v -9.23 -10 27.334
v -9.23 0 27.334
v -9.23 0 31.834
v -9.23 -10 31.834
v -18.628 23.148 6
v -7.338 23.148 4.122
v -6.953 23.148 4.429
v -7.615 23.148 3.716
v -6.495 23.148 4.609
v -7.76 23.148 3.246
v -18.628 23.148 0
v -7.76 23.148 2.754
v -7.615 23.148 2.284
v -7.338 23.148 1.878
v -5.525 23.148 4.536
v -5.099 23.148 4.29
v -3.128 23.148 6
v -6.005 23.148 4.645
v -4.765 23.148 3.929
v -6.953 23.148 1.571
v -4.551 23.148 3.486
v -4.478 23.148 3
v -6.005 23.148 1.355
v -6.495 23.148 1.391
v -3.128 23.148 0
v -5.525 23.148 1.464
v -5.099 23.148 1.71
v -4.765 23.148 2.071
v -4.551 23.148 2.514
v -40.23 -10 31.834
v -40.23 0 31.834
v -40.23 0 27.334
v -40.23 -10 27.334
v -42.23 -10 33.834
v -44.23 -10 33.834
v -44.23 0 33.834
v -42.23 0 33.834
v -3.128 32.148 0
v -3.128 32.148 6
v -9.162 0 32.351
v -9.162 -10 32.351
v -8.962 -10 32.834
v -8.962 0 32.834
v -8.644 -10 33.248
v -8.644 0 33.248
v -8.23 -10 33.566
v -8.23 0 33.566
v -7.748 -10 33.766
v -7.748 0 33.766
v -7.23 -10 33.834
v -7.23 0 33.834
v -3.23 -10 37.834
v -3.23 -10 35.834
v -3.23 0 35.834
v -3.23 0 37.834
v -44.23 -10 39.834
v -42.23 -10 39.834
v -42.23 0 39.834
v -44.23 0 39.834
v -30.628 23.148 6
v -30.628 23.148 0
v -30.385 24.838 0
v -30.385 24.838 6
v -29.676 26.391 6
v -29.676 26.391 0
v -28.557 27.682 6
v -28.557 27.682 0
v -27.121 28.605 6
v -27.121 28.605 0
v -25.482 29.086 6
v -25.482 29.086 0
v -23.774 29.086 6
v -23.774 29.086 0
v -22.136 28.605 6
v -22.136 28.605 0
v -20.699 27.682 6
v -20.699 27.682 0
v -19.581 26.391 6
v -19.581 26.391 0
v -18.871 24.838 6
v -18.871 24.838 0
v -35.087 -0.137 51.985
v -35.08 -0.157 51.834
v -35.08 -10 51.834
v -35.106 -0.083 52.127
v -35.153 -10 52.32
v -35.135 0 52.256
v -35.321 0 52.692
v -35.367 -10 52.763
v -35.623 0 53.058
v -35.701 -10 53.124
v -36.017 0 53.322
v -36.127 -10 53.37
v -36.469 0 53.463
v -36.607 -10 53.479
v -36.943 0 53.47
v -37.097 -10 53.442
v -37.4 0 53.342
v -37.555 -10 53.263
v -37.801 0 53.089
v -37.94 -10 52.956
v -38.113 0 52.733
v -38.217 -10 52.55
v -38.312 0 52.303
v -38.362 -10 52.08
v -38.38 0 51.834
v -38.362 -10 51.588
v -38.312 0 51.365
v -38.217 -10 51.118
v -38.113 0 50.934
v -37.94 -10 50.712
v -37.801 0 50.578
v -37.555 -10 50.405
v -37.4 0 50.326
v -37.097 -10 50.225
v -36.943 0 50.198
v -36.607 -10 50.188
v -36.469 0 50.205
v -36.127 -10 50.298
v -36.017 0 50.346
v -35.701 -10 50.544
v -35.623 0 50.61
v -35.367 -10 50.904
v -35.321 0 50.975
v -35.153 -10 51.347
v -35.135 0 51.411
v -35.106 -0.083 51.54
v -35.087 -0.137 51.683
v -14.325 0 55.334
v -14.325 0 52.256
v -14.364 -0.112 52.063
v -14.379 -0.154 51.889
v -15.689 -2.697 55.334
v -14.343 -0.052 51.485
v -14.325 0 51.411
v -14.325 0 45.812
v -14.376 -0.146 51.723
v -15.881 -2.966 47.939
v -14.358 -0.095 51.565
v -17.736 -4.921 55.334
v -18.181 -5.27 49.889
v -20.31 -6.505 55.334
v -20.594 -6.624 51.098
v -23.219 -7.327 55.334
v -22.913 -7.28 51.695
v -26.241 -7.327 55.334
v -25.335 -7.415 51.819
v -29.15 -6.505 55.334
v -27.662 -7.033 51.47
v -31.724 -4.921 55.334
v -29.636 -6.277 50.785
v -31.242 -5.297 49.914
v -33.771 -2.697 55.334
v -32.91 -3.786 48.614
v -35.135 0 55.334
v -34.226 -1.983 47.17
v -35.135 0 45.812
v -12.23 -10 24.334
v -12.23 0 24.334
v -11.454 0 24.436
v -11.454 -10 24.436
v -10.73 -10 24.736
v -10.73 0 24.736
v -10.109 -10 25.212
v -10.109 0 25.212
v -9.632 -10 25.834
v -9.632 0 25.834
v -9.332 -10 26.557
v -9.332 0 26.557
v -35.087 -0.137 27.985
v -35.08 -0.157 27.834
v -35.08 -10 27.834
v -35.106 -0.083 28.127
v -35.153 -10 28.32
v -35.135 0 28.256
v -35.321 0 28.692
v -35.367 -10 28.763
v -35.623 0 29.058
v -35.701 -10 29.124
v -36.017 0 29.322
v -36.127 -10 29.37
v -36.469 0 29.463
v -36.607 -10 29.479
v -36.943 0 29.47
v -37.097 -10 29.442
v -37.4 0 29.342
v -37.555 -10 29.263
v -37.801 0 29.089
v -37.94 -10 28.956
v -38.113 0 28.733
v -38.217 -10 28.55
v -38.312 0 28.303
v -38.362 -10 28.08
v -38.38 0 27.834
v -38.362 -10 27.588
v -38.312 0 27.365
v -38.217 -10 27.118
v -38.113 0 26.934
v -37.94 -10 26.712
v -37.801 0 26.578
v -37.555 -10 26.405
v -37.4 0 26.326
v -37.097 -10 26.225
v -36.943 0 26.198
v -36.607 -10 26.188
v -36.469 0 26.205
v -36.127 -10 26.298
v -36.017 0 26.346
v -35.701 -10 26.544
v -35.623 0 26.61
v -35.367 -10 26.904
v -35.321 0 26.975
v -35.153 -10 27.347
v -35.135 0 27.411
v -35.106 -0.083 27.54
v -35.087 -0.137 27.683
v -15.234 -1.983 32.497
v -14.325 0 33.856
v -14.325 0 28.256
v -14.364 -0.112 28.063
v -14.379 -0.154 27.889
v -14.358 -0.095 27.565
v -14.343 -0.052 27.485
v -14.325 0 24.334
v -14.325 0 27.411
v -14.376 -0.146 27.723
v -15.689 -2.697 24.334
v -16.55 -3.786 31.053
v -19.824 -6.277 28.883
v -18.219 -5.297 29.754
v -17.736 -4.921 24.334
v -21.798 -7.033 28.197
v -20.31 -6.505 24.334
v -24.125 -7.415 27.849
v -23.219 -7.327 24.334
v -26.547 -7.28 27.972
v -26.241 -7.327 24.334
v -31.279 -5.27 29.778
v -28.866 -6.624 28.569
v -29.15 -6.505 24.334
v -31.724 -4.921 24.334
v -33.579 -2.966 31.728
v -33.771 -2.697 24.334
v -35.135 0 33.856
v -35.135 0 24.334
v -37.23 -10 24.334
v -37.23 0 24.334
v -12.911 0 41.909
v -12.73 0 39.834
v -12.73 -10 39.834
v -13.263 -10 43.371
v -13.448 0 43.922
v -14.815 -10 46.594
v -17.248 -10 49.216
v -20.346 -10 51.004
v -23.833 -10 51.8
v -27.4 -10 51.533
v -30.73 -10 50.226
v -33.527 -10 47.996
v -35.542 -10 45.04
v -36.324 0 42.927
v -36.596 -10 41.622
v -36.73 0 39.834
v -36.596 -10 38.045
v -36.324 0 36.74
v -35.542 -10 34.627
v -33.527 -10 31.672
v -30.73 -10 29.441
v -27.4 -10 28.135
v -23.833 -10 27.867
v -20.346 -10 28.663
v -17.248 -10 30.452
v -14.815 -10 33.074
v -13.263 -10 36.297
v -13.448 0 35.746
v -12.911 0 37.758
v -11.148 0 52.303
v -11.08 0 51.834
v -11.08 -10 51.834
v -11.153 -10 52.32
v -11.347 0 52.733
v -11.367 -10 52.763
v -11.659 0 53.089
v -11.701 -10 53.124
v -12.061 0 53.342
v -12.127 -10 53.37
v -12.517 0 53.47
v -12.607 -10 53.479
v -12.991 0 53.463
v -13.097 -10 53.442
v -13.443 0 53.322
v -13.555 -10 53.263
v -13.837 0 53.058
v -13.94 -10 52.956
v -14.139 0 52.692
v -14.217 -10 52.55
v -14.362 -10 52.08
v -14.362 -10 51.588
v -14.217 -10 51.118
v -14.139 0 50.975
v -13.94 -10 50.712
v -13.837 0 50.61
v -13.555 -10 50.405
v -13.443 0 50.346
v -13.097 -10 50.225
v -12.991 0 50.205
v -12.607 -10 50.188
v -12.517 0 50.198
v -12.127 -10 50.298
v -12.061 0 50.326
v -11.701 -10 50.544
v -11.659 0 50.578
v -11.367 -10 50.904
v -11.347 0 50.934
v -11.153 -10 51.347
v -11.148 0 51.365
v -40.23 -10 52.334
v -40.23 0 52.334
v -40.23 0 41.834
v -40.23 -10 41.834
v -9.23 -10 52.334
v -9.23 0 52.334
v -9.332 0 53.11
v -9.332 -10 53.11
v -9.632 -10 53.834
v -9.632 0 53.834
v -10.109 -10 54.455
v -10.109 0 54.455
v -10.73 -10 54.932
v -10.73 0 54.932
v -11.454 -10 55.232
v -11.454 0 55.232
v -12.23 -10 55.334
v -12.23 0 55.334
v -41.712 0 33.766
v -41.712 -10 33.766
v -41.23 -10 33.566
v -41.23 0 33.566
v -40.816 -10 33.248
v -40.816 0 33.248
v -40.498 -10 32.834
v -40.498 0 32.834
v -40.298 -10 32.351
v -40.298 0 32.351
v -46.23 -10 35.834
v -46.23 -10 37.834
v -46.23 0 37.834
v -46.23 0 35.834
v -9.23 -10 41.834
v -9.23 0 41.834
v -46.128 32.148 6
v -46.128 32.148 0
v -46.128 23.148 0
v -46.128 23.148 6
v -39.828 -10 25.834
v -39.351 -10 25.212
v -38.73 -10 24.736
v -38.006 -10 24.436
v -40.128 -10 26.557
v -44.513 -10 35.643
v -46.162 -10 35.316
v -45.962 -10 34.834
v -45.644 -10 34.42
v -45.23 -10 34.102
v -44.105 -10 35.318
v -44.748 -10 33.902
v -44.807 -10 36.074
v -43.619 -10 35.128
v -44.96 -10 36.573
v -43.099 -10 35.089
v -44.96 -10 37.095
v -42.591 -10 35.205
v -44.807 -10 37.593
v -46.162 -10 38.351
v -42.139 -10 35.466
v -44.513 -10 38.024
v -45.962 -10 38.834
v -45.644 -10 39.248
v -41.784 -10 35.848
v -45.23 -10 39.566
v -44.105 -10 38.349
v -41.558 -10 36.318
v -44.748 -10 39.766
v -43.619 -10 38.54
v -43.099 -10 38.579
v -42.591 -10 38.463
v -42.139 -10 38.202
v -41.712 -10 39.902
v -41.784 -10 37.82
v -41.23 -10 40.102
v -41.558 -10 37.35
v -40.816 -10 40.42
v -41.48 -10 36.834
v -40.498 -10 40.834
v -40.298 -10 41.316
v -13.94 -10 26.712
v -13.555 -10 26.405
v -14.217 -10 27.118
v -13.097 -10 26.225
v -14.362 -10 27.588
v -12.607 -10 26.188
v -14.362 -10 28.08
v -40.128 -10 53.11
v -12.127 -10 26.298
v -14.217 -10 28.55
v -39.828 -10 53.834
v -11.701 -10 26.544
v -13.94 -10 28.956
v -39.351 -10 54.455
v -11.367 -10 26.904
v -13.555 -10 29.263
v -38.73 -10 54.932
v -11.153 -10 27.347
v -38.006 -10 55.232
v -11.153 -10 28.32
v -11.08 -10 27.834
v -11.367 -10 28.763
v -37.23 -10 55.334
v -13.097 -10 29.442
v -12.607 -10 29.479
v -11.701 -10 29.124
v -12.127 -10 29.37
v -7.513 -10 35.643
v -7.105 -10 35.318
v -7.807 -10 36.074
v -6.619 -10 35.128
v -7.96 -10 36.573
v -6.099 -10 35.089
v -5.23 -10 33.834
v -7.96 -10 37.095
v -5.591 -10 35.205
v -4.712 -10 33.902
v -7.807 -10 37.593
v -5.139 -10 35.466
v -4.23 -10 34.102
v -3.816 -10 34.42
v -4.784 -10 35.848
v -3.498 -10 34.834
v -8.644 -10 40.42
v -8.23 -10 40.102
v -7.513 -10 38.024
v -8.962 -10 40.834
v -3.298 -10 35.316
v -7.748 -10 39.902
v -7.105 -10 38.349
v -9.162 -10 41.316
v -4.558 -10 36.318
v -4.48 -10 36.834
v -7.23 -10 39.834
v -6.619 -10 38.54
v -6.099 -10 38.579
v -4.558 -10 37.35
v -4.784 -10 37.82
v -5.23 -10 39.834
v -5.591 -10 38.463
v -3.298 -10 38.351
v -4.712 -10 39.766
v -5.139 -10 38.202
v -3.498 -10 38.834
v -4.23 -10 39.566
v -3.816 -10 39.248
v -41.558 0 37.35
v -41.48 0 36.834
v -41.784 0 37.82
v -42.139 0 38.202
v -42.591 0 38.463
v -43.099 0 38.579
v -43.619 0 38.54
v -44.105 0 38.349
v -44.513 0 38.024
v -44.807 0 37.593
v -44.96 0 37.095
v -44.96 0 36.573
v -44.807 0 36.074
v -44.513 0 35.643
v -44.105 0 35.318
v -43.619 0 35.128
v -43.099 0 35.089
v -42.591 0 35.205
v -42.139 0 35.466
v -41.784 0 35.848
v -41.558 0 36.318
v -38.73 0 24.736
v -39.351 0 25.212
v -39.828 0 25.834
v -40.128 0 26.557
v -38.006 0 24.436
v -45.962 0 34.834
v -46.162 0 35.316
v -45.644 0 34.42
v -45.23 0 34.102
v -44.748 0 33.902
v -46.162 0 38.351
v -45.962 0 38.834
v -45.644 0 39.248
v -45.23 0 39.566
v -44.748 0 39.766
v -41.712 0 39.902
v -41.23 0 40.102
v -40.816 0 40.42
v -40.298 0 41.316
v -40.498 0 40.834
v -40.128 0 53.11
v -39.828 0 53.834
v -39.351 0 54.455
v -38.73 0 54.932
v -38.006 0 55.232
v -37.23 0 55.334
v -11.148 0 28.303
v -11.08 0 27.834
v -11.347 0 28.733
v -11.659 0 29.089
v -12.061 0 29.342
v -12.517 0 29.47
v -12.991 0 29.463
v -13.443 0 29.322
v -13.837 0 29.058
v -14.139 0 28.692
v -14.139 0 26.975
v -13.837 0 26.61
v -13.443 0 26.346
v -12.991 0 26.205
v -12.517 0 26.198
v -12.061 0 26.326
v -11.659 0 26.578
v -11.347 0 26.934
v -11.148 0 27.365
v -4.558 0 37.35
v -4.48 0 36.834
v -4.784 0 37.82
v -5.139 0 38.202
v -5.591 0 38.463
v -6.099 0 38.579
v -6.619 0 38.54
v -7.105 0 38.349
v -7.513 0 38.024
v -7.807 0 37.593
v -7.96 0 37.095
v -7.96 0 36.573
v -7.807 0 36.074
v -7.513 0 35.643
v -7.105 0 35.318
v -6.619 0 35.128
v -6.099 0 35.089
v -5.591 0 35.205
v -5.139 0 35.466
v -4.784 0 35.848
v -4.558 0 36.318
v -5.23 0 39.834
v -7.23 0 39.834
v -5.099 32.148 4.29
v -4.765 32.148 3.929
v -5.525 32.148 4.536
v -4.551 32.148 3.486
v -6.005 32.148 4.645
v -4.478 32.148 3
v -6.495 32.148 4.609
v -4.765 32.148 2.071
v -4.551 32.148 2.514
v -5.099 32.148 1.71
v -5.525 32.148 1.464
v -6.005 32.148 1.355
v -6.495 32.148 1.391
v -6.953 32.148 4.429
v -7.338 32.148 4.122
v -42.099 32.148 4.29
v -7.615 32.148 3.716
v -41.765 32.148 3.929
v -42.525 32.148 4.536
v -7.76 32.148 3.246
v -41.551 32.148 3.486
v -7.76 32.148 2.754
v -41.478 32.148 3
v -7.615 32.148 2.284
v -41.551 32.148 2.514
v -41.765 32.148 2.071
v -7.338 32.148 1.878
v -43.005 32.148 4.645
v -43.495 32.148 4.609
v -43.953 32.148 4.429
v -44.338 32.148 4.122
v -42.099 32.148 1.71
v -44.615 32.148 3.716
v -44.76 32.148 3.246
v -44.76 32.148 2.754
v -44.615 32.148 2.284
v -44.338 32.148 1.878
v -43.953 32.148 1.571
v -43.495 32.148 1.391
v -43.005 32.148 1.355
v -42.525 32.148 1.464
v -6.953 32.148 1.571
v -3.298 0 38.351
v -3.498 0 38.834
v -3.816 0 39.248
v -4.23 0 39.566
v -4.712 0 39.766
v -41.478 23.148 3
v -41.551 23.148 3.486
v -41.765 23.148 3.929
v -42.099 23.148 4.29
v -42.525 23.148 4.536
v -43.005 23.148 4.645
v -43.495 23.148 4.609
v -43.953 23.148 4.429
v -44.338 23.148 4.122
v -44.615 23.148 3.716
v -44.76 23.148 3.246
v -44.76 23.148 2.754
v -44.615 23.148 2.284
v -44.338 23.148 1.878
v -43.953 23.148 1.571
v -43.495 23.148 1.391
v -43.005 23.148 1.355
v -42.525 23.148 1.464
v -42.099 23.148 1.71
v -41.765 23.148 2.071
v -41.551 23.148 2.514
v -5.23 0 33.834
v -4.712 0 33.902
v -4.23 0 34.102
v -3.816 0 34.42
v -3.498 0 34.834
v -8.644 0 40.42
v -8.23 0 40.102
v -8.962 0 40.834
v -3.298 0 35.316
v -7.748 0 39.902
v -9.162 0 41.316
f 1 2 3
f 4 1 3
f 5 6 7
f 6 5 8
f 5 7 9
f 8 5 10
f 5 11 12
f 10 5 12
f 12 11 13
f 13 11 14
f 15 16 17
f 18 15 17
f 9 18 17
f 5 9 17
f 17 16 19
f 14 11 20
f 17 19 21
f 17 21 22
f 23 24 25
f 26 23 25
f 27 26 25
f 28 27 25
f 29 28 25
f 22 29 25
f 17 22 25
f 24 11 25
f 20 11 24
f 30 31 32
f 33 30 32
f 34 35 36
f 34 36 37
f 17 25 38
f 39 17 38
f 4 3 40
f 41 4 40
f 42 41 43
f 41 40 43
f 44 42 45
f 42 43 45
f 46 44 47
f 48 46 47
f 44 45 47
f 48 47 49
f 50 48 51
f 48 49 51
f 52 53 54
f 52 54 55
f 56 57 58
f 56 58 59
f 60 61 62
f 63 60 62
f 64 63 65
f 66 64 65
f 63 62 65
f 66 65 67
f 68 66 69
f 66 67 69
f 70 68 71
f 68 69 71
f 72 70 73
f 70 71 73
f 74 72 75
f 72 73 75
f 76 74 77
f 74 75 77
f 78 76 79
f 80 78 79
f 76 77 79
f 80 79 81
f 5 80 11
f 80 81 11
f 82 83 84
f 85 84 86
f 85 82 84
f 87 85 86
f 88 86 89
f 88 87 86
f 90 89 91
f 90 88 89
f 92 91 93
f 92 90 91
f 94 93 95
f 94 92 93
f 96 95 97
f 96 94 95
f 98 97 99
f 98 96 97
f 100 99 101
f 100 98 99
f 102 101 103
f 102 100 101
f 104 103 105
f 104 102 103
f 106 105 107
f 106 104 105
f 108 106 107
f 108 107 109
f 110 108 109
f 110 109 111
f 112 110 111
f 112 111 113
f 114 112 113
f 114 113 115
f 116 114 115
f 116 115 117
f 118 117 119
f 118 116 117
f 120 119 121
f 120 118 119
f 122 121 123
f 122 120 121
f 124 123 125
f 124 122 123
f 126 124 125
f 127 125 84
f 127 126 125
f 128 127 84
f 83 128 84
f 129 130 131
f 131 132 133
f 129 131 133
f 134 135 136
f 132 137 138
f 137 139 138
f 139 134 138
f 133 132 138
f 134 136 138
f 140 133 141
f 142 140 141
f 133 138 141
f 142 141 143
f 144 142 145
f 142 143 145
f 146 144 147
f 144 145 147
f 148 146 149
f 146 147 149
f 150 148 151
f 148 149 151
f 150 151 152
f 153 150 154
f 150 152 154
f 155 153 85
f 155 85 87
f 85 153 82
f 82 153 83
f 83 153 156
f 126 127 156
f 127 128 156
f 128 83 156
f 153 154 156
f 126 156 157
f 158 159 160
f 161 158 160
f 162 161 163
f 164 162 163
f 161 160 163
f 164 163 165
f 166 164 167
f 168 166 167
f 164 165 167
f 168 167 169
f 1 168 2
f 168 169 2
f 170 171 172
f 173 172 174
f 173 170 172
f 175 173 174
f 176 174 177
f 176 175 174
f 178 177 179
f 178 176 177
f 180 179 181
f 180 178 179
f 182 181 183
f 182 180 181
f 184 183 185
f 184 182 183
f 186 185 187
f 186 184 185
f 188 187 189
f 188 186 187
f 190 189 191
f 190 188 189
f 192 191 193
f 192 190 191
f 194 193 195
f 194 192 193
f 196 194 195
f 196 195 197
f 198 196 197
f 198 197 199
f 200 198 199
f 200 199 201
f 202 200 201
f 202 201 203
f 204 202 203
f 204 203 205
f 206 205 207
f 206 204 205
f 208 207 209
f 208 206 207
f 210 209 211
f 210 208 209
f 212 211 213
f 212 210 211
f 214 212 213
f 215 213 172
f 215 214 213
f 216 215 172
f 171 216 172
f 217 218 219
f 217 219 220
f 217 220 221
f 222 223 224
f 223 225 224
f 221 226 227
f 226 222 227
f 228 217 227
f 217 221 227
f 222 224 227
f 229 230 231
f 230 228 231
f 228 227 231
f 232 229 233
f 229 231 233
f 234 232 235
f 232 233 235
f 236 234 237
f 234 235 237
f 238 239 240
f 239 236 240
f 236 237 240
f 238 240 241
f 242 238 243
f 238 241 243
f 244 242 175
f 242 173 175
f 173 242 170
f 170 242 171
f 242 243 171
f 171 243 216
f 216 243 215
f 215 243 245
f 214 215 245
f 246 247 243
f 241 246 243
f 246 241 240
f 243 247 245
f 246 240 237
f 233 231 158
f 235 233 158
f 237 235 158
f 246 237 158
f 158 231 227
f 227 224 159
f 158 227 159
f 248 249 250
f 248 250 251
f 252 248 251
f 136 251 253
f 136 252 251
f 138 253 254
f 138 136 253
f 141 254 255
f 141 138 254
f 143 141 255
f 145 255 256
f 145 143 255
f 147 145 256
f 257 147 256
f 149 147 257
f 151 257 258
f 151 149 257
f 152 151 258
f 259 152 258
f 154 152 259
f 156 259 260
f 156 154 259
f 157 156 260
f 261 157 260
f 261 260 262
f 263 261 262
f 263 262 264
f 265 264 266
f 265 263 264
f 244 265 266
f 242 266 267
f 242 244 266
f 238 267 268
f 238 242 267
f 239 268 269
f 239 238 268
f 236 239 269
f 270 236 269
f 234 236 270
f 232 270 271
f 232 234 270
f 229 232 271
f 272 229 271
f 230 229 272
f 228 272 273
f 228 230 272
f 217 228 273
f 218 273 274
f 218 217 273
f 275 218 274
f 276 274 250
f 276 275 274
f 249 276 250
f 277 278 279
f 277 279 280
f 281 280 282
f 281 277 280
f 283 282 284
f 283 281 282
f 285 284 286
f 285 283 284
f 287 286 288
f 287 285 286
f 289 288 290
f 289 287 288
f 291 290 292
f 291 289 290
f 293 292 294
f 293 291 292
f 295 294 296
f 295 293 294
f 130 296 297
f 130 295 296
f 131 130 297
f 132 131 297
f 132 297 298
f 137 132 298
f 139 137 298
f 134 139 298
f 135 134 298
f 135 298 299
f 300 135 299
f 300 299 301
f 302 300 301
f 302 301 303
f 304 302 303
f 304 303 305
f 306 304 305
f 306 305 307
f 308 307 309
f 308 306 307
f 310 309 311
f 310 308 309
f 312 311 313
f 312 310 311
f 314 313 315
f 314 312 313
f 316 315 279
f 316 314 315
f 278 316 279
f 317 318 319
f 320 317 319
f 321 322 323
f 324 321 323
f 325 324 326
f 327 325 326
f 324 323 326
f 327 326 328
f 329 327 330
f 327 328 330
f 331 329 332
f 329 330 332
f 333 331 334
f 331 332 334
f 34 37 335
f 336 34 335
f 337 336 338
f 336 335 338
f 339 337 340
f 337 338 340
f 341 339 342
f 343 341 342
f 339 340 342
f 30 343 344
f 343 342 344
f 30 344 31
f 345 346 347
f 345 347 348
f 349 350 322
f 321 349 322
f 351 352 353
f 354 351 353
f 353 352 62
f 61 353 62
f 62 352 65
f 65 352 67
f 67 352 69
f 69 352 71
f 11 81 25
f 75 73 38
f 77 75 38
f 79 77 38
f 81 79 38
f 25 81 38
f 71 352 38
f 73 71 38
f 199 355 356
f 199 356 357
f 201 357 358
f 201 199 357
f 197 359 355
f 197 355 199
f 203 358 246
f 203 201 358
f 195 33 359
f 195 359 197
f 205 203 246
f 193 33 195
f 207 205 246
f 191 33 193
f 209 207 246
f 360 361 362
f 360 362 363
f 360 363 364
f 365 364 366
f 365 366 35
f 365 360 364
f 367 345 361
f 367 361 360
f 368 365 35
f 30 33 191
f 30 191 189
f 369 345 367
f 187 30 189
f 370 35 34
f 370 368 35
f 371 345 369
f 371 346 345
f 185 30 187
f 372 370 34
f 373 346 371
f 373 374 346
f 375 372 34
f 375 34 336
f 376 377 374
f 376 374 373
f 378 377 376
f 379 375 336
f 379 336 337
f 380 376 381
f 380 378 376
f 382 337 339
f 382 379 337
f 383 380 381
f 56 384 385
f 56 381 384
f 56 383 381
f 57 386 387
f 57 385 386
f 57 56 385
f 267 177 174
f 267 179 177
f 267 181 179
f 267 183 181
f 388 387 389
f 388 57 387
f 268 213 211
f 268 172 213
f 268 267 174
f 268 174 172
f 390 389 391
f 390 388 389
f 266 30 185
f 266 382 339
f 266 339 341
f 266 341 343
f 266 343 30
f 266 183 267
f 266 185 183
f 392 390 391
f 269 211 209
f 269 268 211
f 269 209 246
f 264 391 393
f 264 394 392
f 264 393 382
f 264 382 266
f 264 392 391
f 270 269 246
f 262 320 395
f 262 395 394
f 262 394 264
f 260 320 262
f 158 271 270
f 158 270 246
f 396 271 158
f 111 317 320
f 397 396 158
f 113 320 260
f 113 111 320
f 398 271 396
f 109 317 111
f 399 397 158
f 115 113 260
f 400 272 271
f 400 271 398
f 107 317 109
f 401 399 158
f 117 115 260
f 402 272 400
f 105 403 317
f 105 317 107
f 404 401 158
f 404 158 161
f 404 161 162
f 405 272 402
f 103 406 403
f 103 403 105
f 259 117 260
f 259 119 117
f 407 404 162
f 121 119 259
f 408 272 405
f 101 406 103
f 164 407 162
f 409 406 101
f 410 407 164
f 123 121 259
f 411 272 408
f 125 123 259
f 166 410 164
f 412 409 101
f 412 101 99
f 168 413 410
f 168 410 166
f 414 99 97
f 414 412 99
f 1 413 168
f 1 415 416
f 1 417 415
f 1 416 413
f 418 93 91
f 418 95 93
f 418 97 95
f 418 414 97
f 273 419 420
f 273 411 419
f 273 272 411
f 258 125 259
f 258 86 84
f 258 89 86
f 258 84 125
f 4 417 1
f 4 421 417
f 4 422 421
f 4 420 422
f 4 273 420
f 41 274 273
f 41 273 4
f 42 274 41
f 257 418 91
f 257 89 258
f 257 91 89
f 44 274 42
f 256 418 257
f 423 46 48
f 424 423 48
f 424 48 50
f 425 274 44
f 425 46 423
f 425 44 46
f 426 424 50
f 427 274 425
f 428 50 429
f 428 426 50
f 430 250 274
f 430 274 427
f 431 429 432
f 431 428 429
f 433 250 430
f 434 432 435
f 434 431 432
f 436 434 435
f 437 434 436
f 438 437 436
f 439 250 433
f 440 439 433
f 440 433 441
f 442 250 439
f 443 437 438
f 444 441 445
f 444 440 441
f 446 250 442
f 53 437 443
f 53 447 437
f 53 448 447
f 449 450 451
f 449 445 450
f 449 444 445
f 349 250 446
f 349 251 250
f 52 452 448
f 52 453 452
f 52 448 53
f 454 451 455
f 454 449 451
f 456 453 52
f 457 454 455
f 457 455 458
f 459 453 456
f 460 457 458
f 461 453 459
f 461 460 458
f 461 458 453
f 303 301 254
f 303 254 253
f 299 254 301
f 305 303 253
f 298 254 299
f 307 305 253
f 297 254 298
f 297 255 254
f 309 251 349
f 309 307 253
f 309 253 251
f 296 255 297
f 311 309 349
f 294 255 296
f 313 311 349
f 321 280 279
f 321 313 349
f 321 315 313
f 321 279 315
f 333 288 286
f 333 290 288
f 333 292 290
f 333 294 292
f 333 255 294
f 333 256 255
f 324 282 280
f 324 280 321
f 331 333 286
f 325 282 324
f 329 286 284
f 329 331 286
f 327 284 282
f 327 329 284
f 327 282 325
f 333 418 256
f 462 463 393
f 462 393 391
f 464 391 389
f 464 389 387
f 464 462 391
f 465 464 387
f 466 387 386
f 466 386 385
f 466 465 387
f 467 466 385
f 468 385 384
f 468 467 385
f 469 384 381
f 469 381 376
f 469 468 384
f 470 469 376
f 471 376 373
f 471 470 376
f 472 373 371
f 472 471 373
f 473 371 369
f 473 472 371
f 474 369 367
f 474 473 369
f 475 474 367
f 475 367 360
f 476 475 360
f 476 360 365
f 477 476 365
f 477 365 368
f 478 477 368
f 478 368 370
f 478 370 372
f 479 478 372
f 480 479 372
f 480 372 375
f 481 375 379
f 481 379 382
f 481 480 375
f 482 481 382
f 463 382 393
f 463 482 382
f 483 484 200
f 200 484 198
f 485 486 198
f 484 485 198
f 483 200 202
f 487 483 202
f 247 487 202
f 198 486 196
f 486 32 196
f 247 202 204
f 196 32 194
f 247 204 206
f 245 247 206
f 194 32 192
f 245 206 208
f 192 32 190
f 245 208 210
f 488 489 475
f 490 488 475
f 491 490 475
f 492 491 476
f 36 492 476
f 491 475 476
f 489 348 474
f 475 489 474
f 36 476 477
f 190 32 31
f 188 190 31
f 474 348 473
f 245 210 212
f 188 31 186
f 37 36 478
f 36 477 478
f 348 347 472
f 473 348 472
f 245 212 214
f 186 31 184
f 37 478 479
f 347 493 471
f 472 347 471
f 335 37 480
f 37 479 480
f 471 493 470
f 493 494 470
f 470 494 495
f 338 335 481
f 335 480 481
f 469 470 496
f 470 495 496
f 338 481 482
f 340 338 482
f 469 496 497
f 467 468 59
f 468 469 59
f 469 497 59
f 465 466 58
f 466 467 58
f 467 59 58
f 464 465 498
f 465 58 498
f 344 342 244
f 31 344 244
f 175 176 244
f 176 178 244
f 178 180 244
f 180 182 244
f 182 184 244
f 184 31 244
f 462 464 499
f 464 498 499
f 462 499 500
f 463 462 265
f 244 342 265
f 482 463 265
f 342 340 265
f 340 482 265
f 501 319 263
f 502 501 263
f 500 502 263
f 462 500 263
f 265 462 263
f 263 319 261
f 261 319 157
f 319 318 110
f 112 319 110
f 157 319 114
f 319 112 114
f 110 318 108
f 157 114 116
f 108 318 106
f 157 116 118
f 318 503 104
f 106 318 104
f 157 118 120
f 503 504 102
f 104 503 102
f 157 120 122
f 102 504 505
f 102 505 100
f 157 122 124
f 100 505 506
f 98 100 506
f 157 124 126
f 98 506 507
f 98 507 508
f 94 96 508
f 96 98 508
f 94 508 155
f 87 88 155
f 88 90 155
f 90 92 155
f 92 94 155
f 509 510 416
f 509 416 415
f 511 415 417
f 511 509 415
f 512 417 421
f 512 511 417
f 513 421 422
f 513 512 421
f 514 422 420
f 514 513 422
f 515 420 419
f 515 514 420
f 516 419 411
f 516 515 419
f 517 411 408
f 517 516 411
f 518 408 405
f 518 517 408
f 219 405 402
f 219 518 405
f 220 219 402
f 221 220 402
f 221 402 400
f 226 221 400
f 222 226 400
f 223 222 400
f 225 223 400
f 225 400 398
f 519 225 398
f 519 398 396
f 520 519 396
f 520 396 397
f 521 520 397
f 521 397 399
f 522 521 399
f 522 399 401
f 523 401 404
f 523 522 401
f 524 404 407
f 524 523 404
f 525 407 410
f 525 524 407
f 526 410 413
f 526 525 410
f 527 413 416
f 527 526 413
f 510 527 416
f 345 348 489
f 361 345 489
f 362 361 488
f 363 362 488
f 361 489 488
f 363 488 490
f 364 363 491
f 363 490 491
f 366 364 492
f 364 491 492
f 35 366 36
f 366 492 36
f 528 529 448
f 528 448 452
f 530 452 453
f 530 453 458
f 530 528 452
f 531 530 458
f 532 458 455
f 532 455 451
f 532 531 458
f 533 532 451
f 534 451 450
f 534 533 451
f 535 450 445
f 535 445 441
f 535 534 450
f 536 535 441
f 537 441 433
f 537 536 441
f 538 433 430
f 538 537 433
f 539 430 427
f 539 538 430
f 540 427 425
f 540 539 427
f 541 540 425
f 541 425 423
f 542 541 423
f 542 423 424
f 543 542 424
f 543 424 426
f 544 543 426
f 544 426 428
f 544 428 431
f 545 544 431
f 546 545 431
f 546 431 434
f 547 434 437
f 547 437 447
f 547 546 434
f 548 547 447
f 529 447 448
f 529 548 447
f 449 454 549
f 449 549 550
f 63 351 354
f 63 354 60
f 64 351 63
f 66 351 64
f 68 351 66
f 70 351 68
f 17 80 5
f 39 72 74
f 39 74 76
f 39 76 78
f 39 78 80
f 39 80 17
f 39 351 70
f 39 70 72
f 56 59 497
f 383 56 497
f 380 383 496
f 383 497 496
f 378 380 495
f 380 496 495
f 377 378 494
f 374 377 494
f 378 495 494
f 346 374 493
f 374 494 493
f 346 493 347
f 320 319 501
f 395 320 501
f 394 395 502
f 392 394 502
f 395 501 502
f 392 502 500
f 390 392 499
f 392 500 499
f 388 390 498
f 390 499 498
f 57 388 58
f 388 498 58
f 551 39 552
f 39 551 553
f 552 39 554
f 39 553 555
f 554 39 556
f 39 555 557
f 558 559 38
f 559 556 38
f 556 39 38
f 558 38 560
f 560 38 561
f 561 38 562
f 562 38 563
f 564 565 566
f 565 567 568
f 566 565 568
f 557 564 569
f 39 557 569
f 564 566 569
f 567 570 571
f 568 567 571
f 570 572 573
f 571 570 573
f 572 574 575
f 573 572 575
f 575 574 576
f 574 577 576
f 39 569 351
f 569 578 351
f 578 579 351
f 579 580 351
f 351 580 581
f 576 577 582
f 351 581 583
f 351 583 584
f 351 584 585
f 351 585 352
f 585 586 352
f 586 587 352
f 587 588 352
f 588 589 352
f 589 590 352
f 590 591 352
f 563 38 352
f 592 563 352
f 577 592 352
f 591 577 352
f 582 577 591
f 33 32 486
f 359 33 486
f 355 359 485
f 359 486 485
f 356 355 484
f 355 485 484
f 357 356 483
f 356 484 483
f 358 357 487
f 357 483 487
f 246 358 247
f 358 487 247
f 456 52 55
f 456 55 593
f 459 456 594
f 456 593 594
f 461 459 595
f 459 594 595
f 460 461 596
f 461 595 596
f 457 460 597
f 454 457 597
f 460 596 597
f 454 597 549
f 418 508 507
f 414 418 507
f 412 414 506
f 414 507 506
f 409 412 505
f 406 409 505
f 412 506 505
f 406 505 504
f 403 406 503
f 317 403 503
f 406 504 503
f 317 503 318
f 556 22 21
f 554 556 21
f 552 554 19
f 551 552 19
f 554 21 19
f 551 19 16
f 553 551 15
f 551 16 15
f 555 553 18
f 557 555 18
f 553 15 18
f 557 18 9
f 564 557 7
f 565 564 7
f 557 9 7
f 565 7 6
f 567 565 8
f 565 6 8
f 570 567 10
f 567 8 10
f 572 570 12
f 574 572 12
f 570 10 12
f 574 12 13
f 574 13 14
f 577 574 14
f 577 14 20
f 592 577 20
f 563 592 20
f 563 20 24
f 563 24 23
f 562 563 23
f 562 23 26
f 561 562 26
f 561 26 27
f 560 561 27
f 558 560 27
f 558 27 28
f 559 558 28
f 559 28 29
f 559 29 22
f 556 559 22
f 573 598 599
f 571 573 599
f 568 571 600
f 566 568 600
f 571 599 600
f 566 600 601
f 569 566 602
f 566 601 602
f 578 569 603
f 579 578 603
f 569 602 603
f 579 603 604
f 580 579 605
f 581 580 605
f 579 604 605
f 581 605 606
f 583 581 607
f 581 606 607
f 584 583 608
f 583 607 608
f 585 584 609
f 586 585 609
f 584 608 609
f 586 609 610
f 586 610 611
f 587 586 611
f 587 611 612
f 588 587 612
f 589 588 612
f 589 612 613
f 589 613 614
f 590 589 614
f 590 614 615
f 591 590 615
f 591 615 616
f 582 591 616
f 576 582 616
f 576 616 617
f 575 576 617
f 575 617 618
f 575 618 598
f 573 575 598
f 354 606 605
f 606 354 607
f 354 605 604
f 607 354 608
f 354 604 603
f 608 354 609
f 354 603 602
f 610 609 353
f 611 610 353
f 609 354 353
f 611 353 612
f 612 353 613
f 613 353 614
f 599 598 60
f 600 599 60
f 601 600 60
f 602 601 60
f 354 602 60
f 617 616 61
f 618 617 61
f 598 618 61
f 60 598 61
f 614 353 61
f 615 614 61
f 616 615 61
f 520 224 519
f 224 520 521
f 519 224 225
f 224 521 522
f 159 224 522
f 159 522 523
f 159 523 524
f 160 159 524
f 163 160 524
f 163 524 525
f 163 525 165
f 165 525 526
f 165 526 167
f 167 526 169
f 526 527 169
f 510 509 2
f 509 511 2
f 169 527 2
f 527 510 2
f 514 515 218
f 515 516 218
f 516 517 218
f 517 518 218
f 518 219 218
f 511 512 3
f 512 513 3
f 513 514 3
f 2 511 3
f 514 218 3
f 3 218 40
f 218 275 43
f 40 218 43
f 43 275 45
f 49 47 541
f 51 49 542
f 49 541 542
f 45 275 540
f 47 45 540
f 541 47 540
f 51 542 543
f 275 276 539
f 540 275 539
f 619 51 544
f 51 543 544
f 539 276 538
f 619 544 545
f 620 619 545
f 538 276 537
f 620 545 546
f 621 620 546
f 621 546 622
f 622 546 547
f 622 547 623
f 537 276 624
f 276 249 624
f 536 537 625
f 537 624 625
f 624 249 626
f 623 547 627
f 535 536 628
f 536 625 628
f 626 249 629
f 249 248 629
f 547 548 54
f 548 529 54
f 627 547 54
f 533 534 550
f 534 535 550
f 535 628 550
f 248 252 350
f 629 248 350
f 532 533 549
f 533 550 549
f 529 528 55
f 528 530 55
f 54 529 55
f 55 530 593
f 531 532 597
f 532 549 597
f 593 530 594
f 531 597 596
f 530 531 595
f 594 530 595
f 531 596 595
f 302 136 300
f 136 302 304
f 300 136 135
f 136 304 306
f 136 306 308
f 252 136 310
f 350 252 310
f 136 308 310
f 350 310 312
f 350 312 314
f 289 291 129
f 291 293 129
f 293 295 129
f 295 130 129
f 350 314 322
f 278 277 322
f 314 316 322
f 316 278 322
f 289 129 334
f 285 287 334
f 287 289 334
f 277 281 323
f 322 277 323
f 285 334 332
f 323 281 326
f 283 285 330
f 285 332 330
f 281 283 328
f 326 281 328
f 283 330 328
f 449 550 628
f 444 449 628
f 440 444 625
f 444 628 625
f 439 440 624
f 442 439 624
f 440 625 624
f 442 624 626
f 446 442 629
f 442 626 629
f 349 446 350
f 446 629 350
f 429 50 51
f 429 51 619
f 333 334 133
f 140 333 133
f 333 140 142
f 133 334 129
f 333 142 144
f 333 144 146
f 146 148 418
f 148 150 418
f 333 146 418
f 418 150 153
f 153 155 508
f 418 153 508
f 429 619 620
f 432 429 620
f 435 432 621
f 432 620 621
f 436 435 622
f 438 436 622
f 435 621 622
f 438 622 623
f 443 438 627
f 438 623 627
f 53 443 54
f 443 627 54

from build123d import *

# Parameters (mm, degrees)
F0_R     = 1.65
F0_R_2   = 1.75
F0_R_3   = 12
F1_DEPTH = 10
F3_DEPTH = 45
F5_DEPTH = 6
F6_R     = 1.65
F7_DEPTH = 25
F8_DEPTH = 25


with BuildPart() as f1:
    # F0 (on Front) → F1 (new body)
    with BuildSketch(Plane.XZ):
        with BuildLine():
            Line((-12.2300398648, 55.3337899446), (-37.2300398648, 55.3337899446))
            ThreePointArc((-37.2300398648, 55.3337899446), (-39.3513602083, 54.4551102882), (-40.2300398648, 52.3337899446))
            Line((-40.2300398648, 52.3337899446), (-40.2300398648, 41.8337899446))
            ThreePointArc((-40.2300398648, 41.8337899446), (-40.8158263024, 40.4195763823), (-42.2300398648, 39.8337899446))
            Line((-42.2300398648, 39.8337899446), (-44.2300398648, 39.8337899446))
            ThreePointArc((-44.2300398648, 39.8337899446), (-45.6442534272, 39.248003507), (-46.2300398648, 37.8337899446))
            Line((-46.2300398648, 37.8337899446), (-46.2300398648, 35.8337899446))
            ThreePointArc((-46.2300398648, 35.8337899446), (-45.6442534272, 34.4195763823), (-44.2300398648, 33.8337899446))
            Line((-44.2300398648, 33.8337899446), (-42.2300398648, 33.8337899446))
            ThreePointArc((-42.2300398648, 33.8337899446), (-40.8158263024, 33.248003507), (-40.2300398648, 31.8337899446))
            Line((-40.2300398648, 31.8337899446), (-40.2300398648, 27.3337899446))
            ThreePointArc((-40.2300398648, 27.3337899446), (-39.3513602083, 25.2124696011), (-37.2300398648, 24.3337899446))
            Line((-37.2300398648, 24.3337899446), (-12.2300398648, 24.3337899446))
            ThreePointArc((-12.2300398648, 24.3337899446), (-10.1087195212, 25.2124696011), (-9.2300398648, 27.3337899446))
            Line((-9.2300398648, 27.3337899446), (-9.2300398648, 31.8337899446))
            ThreePointArc((-9.2300398648, 31.8337899446), (-8.6442534272, 33.248003507), (-7.2300398648, 33.8337899446))
            Line((-7.2300398648, 33.8337899446), (-5.2300398648, 33.8337899446))
            ThreePointArc((-5.2300398648, 33.8337899446), (-3.8158263024, 34.4195763823), (-3.2300398648, 35.8337899446))
            Line((-3.2300398648, 35.8337899446), (-3.2300398648, 37.8337899446))
            ThreePointArc((-3.2300398648, 37.8337899446), (-3.8158263024, 39.248003507), (-5.2300398648, 39.8337899446))
            Line((-5.2300398648, 39.8337899446), (-7.2300398648, 39.8337899446))
            ThreePointArc((-7.2300398648, 39.8337899446), (-8.6442534272, 40.4195763823), (-9.2300398648, 41.8337899446))
            Line((-9.2300398648, 41.8337899446), (-9.2300398648, 52.3337899446))
            ThreePointArc((-9.2300398648, 52.3337899446), (-10.1087195212, 54.4551102882), (-12.2300398648, 55.3337899446))
        make_face()
        with Locations((-36.7300398648, 27.8337899446)):
            Circle(F0_R, mode=Mode.SUBTRACT)
        with Locations((-43.2300398648, 36.8337899446)):
            Circle(F0_R_2, mode=Mode.SUBTRACT)
        with Locations((-12.7300398648, 27.8337899446)):
            Circle(F0_R, mode=Mode.SUBTRACT)
        with Locations((-24.7300398648, 39.8337899446)):
            Circle(F0_R_3, mode=Mode.SUBTRACT)
        with Locations((-6.2300398648, 36.8337899446)):
            Circle(F0_R_2, mode=Mode.SUBTRACT)
        with Locations((-36.7300398648, 51.8337899446)):
            Circle(F0_R, mode=Mode.SUBTRACT)
        with Locations((-12.7300398648, 51.8337899446)):
            Circle(F0_R, mode=Mode.SUBTRACT)
    extrude(amount=F1_DEPTH)

    # F2 (on face) → F3 (cut)
    with BuildSketch(Plane(origin=(0, 0, 24.3337899446), x_dir=(1, 0, 0), z_dir=(0, 0, -1))):
        with BuildLine():
            Line((-35.1351045151, 0), (-14.3249752145, 0))
            ThreePointArc((-14.3249752145, 0), (-24.7300398648, 7.431438718), (-35.1351045151, 0))
        make_face()
    extrude(amount=-F3_DEPTH, mode=Mode.SUBTRACT)


with BuildPart() as f5:
    # F4 (on Top) → F5 (new body)
    with BuildSketch(Plane.XY):
        with BuildLine():
            ThreePointArc((-30.6281910539, 23.1475066394), (-24.6281910539, 29.1475066394), (-18.6281910539, 23.1475066394))
            Line((-18.6281910539, 23.1475066394), (-3.1281910539, 23.1475066394))
            Line((-3.1281910539, 23.1475066394), (-3.1281910539, 32.1475066394))
            Line((-3.1281910539, 32.1475066394), (-46.1281910539, 32.1475066394))
            Line((-46.1281910539, 32.1475066394), (-46.1281910539, 23.1475066394))
            Line((-46.1281910539, 23.1475066394), (-30.6281910539, 23.1475066394))
        make_face()
    extrude(amount=F5_DEPTH)

    # F6 (on face) → F7 (cut)
    with BuildSketch(Plane.XZ.offset(-23.1475066394)):
        with Locations((-6.1281910539, 3)):
            Circle(F6_R)
    extrude(amount=-F7_DEPTH, mode=Mode.SUBTRACT)

    # F6 (on face) → F8 (cut)
    with BuildSketch(Plane.XZ.offset(-23.1475066394)):
        with Locations((-43.1281910539, 3)):
            Circle(F6_R)
    extrude(amount=-F8_DEPTH, mode=Mode.SUBTRACT)


solid = Compound([f1.part, f5.part])
